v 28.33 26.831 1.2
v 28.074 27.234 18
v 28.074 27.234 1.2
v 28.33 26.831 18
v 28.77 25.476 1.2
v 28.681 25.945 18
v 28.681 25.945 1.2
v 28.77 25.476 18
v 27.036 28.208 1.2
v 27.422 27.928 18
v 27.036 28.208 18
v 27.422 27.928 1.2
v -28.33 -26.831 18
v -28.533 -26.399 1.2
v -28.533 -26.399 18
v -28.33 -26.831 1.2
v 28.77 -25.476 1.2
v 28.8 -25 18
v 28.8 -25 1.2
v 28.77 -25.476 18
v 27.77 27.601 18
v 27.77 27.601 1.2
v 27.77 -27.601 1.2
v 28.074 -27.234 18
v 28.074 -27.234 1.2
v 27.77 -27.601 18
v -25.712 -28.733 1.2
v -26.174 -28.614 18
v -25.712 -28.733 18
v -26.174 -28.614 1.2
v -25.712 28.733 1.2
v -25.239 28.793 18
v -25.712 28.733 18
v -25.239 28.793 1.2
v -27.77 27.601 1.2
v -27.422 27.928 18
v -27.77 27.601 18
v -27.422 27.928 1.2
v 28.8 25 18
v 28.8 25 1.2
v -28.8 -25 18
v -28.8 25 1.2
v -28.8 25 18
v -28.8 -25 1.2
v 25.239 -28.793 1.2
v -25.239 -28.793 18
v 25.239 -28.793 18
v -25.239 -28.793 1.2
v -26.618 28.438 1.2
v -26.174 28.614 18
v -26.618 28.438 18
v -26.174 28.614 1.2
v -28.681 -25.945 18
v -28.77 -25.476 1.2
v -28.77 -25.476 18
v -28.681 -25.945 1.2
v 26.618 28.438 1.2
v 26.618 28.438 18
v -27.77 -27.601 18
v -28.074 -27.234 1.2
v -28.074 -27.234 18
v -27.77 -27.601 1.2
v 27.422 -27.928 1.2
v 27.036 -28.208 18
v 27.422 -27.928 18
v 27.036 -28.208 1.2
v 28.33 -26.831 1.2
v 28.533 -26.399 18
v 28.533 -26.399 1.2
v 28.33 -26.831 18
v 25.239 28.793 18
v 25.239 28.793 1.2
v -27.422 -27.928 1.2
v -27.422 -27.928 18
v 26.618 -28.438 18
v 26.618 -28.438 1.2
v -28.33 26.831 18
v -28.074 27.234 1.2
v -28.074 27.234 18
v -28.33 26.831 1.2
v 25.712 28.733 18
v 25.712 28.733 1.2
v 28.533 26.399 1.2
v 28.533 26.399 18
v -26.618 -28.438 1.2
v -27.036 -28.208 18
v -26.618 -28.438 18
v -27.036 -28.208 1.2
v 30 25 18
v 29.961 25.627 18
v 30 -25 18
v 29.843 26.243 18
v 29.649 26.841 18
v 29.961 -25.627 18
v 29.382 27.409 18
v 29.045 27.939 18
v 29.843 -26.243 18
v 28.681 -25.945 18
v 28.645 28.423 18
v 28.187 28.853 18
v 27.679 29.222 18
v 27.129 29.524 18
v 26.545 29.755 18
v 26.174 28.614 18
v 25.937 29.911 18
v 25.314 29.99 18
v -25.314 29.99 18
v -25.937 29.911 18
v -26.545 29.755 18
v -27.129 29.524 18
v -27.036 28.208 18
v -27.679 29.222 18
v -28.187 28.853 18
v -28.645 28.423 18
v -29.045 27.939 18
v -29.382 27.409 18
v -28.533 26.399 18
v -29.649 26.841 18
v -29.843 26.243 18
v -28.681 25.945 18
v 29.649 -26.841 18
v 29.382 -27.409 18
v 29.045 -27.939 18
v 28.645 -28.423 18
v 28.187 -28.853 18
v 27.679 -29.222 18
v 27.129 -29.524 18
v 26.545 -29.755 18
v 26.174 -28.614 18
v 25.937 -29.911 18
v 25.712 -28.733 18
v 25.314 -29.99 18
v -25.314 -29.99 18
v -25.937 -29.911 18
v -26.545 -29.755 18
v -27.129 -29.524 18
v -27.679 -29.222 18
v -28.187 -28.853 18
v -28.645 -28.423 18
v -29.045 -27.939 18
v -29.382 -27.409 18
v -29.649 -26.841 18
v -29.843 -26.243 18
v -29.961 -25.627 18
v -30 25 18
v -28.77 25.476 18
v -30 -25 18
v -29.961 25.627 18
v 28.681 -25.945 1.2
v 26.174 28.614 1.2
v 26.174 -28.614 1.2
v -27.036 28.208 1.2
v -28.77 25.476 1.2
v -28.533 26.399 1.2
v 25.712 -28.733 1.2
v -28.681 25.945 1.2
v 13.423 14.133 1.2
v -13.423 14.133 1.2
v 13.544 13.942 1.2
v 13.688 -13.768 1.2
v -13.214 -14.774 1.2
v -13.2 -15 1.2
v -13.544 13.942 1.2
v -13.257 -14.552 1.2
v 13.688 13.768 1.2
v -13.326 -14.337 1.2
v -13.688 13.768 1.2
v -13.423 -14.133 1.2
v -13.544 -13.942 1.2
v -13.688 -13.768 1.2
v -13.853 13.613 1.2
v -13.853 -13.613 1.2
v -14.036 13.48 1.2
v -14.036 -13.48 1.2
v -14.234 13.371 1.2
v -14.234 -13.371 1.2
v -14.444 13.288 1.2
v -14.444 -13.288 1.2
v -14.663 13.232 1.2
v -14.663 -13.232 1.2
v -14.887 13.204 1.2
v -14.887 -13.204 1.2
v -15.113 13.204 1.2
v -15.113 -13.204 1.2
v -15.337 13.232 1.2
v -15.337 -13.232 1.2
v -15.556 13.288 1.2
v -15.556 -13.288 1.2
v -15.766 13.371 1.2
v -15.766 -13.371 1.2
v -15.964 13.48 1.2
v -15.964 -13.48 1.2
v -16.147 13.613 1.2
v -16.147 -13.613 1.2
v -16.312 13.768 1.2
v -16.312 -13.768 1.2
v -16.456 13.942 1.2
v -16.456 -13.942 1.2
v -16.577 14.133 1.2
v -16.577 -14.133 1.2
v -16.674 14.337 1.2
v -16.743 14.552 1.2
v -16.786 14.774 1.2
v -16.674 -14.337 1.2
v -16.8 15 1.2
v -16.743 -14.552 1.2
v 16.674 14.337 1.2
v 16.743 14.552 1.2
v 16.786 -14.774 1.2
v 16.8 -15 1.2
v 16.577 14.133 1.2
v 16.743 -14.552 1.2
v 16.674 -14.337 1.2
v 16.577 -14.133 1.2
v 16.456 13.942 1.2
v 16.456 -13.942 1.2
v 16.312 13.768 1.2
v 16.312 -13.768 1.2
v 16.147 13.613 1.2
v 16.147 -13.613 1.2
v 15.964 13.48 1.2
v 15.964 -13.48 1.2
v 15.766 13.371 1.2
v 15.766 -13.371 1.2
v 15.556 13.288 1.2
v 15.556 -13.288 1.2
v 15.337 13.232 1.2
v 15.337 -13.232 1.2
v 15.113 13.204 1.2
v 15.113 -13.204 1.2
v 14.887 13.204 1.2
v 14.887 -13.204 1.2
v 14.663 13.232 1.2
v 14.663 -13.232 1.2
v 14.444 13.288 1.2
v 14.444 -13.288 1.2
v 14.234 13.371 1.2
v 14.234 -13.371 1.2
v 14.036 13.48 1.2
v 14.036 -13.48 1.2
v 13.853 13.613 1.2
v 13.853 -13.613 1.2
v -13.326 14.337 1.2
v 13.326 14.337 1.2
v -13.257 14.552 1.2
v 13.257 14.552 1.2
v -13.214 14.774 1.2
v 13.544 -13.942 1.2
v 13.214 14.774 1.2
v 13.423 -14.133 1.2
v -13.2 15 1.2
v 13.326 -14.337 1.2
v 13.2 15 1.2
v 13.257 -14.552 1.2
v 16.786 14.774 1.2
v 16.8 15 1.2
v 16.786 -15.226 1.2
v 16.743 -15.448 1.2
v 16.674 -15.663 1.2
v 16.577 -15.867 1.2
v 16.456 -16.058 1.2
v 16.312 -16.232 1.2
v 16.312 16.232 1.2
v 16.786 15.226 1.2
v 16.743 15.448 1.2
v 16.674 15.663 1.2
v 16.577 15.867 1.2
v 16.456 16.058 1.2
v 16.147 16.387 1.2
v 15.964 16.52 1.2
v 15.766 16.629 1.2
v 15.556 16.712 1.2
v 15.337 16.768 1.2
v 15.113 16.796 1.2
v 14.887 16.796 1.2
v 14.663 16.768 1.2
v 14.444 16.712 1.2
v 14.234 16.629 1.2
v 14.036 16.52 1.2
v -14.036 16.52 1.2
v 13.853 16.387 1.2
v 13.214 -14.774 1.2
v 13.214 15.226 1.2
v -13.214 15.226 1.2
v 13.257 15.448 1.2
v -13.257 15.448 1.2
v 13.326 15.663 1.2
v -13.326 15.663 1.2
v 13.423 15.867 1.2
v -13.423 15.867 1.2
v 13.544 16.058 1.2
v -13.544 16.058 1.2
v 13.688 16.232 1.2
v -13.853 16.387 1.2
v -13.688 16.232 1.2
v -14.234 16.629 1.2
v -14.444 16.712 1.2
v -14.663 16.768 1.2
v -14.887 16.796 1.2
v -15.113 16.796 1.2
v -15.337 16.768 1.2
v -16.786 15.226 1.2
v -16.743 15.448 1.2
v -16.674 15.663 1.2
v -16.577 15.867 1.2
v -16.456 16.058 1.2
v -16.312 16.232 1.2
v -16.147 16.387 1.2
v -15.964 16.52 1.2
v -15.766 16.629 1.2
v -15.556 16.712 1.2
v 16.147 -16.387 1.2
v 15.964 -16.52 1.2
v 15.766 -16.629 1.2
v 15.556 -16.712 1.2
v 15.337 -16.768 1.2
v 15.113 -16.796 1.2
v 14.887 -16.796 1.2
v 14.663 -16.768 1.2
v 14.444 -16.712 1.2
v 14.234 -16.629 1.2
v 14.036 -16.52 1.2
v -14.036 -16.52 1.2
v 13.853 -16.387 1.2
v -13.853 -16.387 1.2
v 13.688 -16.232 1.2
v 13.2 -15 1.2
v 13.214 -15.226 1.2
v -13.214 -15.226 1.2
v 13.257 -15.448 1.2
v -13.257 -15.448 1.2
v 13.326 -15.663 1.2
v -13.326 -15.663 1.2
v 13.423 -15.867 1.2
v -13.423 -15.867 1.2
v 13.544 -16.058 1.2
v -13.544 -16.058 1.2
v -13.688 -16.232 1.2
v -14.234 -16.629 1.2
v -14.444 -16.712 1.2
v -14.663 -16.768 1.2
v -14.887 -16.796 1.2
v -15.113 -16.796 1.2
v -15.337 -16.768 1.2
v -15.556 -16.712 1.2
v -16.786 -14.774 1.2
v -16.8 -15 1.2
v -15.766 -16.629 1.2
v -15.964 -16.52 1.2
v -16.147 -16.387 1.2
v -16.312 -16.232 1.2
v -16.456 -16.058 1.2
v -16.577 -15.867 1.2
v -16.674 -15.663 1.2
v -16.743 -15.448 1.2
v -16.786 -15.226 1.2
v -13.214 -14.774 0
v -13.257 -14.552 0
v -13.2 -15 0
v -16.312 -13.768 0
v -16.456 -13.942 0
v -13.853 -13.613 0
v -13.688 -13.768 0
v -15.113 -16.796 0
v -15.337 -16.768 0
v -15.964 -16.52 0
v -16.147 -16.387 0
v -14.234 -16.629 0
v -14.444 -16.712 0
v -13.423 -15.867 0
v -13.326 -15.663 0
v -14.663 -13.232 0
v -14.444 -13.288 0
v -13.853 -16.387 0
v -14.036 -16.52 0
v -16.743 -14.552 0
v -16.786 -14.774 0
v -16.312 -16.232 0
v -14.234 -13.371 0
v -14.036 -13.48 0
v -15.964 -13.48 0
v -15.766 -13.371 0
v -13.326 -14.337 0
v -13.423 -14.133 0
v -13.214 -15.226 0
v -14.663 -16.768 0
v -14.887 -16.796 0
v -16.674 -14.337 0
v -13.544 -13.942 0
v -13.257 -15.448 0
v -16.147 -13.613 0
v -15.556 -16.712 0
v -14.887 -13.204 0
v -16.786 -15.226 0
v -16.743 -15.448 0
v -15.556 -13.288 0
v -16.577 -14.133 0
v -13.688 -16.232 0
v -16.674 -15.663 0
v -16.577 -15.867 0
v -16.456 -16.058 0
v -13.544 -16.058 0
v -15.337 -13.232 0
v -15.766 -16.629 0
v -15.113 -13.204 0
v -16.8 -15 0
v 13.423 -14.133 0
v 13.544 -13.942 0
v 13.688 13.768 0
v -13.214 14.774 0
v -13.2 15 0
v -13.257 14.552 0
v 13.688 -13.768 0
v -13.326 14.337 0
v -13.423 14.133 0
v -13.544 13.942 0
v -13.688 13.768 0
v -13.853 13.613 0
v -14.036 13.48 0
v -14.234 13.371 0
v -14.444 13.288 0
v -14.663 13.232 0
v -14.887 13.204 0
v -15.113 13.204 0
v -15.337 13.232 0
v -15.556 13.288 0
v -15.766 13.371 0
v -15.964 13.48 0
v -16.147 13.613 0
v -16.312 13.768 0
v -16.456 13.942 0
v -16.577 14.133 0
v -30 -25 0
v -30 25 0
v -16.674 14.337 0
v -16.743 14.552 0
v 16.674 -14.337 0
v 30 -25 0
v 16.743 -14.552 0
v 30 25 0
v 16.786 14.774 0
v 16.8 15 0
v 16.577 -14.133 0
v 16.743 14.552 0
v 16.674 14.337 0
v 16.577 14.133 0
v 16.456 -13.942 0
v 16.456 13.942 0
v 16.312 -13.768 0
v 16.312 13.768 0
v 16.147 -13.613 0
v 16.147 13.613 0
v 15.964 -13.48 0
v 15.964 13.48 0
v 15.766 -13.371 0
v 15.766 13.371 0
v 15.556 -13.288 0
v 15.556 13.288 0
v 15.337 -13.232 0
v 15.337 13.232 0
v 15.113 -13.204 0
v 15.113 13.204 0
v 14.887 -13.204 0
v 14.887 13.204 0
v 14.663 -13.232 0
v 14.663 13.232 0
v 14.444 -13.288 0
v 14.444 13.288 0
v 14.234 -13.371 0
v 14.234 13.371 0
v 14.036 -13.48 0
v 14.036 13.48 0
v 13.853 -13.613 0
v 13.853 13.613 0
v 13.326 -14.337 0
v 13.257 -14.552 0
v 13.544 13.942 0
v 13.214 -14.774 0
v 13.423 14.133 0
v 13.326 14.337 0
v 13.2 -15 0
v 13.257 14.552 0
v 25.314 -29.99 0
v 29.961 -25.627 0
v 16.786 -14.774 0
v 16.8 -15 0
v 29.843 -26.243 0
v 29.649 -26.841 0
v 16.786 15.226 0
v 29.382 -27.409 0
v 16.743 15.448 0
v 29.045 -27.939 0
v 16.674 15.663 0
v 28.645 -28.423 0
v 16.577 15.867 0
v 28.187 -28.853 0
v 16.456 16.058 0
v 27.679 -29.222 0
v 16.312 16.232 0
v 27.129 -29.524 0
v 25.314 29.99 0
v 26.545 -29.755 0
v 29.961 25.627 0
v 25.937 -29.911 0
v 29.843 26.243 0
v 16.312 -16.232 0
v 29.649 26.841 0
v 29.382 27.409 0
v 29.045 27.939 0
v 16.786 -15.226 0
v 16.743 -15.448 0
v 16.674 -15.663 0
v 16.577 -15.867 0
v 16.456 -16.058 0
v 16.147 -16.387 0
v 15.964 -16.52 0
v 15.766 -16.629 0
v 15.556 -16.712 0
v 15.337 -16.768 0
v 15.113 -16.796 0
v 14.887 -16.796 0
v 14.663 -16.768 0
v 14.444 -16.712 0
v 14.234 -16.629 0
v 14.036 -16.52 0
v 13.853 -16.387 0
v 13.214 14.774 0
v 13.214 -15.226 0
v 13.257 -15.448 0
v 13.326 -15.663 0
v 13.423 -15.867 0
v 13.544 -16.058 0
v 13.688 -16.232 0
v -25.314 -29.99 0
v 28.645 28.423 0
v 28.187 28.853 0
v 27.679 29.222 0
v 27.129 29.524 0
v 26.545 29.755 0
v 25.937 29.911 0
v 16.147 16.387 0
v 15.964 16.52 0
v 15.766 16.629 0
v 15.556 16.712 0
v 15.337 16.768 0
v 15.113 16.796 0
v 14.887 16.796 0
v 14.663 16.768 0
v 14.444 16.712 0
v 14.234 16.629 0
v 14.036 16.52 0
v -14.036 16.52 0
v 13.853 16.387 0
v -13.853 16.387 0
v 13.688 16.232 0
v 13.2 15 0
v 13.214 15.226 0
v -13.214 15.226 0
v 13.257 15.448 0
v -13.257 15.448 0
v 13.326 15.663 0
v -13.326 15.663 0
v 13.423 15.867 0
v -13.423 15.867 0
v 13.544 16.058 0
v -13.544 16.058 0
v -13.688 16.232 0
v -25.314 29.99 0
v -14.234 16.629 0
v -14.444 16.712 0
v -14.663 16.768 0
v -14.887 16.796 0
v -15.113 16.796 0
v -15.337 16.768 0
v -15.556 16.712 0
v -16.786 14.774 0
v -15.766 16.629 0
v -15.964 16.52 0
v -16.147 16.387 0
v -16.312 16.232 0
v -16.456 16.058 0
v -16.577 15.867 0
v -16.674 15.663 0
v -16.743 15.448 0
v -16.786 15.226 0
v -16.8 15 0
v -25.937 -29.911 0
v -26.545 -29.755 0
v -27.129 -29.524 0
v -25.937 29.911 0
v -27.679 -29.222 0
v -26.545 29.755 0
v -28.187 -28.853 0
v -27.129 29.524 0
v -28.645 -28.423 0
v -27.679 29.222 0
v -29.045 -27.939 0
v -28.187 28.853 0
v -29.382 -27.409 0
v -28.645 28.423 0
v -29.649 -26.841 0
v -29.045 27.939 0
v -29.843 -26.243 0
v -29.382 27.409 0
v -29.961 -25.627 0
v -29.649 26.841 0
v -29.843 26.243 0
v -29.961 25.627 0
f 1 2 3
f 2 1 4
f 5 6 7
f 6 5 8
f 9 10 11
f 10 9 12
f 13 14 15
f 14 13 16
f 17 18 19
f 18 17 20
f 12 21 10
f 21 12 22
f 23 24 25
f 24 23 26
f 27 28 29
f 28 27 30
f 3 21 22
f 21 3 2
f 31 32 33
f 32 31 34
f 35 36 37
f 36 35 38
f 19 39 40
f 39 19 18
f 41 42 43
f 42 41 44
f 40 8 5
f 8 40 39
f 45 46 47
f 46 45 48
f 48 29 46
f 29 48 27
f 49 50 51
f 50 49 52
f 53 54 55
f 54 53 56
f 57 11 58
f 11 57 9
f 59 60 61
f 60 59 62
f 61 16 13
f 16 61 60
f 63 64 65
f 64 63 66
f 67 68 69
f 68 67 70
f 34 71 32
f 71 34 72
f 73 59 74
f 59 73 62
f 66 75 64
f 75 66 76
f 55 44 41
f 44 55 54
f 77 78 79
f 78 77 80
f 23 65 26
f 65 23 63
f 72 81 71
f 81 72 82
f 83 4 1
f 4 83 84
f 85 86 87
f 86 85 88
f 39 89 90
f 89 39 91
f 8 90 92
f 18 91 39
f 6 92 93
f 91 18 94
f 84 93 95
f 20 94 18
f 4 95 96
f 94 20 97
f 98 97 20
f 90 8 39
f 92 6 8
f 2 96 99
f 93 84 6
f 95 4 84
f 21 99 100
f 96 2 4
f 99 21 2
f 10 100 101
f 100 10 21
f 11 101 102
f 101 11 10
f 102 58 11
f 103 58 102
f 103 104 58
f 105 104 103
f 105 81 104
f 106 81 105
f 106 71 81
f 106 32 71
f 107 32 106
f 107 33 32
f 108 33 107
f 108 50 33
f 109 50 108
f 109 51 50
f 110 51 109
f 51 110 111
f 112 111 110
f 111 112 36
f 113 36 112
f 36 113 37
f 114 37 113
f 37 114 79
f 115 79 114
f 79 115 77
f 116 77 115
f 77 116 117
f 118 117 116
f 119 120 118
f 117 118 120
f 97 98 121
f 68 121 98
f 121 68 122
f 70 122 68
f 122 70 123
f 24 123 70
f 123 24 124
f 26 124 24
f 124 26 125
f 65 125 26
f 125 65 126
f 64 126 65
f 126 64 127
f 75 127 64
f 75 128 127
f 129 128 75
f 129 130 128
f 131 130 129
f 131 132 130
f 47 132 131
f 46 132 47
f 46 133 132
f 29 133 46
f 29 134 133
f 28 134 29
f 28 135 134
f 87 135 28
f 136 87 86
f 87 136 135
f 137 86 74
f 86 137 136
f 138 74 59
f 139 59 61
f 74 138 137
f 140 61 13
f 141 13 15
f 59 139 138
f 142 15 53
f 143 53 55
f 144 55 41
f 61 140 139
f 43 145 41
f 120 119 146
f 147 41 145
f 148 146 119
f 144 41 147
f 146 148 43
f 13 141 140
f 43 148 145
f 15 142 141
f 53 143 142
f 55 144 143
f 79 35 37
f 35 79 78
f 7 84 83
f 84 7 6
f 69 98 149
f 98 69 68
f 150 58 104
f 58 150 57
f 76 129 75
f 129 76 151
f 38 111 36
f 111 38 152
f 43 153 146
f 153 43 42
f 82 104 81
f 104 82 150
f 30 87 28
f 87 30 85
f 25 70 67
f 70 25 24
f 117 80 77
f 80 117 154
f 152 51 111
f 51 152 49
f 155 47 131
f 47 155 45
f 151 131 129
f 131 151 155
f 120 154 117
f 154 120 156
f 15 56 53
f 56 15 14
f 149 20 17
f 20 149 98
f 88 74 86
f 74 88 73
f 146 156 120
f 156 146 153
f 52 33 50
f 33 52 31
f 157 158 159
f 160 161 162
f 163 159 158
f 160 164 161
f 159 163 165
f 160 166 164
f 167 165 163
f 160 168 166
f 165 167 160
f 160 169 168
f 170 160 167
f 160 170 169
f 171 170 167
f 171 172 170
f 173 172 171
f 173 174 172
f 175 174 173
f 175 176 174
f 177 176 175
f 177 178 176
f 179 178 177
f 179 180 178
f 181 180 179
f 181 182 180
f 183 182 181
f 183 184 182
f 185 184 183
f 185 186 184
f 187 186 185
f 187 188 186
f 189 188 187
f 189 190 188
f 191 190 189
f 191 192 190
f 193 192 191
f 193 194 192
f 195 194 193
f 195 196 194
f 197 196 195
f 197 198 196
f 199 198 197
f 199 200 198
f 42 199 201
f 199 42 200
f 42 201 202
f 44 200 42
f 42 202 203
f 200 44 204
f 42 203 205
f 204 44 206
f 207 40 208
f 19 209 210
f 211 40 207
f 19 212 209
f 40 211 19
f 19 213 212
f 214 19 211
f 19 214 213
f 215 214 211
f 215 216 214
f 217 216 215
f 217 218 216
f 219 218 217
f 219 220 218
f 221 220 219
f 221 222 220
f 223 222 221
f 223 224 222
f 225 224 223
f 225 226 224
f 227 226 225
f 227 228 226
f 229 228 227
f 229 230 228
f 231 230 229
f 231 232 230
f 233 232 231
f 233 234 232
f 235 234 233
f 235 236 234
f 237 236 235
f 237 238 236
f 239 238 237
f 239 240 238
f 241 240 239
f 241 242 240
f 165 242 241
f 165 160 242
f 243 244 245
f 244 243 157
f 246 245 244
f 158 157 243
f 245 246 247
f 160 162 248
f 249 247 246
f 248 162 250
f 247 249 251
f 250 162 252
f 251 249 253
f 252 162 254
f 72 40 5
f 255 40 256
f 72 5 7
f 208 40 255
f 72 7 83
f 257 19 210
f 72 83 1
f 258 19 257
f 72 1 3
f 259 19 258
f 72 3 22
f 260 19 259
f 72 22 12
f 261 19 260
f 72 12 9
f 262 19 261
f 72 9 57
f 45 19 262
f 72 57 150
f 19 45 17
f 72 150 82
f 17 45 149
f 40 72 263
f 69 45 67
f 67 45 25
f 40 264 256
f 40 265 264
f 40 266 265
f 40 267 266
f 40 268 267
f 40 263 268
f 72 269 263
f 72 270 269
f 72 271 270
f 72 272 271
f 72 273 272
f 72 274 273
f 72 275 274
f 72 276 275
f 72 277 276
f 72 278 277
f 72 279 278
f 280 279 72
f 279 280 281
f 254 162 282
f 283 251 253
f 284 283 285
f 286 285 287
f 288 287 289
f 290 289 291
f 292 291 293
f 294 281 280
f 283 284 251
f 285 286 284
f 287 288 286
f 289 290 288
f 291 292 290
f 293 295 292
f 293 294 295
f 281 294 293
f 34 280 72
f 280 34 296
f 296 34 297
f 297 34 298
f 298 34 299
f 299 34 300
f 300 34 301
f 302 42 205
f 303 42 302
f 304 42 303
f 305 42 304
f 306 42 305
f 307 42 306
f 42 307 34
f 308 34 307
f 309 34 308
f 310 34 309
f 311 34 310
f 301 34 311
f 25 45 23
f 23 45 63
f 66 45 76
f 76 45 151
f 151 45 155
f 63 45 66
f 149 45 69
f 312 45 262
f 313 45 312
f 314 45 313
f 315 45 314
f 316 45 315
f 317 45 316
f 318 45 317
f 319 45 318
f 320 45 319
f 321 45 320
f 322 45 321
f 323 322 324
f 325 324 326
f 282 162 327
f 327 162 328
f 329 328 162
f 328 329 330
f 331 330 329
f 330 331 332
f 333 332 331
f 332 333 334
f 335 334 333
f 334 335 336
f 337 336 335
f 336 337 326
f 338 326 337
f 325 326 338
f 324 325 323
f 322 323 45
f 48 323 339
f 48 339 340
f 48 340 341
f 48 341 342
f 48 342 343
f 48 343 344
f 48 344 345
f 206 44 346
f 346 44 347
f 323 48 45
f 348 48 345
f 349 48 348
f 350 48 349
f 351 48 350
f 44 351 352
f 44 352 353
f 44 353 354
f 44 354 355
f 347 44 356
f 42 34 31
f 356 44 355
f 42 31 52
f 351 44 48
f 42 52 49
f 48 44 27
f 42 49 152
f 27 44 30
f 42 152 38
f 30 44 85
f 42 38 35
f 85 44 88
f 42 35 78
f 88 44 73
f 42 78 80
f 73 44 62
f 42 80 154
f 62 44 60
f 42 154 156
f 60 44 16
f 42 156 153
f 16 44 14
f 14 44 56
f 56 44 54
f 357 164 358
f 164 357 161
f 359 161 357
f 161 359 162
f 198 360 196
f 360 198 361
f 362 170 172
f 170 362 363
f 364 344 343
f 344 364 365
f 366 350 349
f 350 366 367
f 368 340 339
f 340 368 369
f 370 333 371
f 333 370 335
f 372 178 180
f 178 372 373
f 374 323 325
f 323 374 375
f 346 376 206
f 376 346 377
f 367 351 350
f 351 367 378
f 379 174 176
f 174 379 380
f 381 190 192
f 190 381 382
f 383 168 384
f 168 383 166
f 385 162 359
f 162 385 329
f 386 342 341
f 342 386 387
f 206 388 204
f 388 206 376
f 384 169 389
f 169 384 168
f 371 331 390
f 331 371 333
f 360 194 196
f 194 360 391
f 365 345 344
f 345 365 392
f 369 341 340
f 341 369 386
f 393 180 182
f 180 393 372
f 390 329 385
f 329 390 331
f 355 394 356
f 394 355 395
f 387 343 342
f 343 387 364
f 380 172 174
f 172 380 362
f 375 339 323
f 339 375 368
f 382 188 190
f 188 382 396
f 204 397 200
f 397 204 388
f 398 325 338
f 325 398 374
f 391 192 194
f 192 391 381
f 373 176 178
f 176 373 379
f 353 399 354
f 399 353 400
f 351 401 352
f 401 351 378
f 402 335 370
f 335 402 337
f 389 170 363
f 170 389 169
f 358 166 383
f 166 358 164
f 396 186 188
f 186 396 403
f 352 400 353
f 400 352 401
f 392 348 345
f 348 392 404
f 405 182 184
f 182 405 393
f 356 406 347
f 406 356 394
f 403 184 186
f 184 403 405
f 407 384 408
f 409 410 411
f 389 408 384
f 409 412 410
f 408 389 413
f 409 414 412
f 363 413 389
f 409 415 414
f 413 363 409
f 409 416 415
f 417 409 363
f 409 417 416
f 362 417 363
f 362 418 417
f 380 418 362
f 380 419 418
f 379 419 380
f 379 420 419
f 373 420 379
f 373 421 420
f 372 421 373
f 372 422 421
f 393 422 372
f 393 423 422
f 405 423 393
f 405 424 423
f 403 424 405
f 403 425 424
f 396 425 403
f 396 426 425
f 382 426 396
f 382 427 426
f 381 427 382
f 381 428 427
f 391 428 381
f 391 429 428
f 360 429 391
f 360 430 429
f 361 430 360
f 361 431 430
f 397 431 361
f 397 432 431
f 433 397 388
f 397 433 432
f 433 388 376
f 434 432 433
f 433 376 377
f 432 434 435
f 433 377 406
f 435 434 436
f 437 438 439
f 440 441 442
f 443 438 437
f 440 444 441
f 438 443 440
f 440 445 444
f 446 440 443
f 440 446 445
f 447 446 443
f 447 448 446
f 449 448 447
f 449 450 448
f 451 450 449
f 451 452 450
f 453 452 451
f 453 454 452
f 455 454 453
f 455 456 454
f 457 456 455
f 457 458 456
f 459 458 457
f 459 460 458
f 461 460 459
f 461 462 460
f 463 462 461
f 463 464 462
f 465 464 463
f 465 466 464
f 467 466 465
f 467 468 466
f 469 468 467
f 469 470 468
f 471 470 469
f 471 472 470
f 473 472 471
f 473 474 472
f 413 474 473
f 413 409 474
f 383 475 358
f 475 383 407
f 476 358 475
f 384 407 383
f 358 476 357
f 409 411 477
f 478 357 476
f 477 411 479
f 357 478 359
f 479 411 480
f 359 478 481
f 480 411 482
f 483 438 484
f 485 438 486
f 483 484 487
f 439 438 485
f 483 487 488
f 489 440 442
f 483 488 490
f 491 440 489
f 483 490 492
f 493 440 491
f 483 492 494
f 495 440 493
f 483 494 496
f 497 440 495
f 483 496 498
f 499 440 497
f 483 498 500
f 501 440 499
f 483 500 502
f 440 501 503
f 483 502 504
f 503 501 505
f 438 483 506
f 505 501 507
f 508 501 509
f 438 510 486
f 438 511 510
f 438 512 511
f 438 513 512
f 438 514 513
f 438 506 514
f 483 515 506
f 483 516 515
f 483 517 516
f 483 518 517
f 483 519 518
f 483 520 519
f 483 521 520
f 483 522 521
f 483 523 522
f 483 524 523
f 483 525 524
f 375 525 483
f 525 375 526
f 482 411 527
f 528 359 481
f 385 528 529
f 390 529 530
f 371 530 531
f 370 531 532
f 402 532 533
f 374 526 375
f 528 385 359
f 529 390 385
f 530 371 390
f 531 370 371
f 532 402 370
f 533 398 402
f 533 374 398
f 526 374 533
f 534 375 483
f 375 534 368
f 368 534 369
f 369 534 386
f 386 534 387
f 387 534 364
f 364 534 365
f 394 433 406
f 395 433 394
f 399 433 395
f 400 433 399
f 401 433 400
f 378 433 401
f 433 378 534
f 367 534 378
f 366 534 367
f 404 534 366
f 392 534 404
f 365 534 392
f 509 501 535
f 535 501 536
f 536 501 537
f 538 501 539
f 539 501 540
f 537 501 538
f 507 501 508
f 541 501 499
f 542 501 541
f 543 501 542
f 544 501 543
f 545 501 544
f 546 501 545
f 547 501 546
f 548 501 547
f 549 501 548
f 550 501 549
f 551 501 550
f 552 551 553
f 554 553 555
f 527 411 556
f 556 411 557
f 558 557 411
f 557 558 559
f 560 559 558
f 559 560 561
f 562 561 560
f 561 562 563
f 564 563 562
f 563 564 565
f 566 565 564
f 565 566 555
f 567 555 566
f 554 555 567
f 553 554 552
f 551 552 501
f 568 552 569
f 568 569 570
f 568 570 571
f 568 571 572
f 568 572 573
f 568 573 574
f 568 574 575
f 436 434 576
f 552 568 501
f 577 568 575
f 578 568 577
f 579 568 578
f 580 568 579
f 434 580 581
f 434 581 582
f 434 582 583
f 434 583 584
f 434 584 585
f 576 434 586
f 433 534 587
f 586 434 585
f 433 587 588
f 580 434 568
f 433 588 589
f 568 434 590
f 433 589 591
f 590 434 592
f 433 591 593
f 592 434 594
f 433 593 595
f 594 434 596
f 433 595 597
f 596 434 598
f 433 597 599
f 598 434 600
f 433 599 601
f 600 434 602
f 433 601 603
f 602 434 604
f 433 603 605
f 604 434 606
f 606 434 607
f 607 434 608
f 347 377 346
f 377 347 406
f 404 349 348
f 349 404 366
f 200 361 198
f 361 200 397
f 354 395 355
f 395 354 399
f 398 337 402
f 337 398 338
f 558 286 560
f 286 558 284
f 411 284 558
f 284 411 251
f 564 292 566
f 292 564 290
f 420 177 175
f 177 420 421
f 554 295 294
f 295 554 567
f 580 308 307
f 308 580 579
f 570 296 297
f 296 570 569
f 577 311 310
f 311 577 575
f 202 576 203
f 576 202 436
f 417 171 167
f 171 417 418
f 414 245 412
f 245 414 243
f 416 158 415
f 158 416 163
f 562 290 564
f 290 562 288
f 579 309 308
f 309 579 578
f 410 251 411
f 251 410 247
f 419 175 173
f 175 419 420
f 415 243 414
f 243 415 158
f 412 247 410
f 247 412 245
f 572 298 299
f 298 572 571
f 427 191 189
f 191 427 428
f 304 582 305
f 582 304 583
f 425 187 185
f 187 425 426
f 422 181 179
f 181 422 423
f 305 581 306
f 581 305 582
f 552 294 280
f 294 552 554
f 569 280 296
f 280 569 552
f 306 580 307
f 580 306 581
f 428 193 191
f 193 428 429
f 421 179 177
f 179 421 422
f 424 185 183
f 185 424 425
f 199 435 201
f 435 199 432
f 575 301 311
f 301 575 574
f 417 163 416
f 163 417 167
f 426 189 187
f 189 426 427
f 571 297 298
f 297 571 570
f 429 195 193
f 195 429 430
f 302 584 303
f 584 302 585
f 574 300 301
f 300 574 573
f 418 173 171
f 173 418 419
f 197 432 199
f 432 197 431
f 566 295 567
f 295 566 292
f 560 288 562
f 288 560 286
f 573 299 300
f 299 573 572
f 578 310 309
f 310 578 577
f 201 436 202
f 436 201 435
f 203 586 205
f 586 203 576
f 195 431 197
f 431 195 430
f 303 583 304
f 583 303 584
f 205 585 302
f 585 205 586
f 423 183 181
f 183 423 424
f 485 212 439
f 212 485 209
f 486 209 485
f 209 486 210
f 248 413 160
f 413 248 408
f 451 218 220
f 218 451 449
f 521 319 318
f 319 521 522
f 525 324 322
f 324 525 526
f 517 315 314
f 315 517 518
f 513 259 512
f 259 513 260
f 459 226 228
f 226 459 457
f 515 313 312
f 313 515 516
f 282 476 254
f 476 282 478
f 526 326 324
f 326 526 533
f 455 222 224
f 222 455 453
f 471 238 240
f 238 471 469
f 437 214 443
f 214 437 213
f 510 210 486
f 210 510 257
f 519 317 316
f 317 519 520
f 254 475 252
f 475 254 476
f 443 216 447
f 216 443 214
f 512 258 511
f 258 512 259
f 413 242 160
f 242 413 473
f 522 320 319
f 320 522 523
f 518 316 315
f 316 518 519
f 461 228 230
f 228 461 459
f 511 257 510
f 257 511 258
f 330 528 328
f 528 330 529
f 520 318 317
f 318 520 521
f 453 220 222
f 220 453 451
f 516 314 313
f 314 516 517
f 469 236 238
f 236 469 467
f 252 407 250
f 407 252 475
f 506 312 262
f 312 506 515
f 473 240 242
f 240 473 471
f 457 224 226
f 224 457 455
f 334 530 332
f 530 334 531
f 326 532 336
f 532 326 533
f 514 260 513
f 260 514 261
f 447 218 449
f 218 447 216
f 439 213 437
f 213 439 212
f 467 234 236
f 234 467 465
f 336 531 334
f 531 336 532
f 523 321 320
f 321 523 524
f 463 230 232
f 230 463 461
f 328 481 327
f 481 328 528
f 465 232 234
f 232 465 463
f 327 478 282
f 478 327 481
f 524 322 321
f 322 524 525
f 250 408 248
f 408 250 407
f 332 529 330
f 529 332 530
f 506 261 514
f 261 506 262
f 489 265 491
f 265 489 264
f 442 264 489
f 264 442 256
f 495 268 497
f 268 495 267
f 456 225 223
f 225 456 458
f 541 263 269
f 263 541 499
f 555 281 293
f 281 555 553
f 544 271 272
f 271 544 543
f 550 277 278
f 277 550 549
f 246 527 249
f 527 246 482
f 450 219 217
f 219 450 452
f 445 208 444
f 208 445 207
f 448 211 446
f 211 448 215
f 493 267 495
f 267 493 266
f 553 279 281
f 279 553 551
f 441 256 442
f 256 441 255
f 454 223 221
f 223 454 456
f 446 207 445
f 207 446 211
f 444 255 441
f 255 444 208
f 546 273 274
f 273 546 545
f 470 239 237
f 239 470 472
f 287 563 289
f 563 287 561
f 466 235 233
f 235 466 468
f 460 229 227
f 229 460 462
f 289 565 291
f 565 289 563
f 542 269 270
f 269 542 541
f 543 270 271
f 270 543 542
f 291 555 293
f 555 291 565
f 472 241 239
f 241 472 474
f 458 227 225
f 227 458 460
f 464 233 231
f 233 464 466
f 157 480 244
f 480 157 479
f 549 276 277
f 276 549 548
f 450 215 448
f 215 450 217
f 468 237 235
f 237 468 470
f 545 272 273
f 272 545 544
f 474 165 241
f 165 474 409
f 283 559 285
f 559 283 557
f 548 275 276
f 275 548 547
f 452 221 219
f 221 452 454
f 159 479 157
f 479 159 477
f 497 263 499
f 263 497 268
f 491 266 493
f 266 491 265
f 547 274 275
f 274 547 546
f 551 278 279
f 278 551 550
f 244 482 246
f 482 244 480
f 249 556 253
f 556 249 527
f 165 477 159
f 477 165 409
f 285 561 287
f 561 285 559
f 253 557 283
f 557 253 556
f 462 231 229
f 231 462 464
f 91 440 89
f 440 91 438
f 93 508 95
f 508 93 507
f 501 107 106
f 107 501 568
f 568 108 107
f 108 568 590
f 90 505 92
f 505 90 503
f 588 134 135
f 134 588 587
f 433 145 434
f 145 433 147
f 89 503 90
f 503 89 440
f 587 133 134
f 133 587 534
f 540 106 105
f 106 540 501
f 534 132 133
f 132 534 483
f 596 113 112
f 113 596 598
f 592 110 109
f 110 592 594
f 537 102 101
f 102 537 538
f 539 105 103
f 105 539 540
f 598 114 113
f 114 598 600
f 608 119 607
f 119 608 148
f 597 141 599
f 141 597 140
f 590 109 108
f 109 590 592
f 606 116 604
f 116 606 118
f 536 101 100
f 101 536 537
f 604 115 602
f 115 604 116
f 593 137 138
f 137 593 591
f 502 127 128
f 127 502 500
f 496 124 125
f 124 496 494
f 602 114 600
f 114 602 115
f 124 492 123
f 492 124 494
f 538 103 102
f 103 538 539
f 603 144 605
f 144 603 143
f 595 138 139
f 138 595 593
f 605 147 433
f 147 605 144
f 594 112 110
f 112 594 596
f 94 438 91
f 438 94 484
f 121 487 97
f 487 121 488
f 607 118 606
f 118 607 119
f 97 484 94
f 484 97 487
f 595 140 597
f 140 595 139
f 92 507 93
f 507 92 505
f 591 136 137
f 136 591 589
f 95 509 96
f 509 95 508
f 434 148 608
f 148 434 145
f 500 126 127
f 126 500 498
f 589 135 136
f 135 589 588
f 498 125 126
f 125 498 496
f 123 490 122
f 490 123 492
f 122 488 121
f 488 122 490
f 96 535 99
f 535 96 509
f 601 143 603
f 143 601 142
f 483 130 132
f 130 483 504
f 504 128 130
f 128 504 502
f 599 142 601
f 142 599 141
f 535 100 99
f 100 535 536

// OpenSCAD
$fn = 50;


difference() {
	union() {
		hull() {
			translate(v = [-25.0000000000, 25.0000000000, 0]) {
				cylinder(h = 18, r = 5);
			}
			translate(v = [25.0000000000, 25.0000000000, 0]) {
				cylinder(h = 18, r = 5);
			}
			translate(v = [-25.0000000000, -25.0000000000, 0]) {
				cylinder(h = 18, r = 5);
			}
			translate(v = [25.0000000000, -25.0000000000, 0]) {
				cylinder(h = 18, r = 5);
			}
		}
	}
	union() {
		translate(v = [0, 0, 1.2000000000]) {
			hull() {
				translate(v = [-25.0000000000, 25.0000000000, 0]) {
					cylinder(h = 16.8000000000, r = 3.8000000000);
				}
				translate(v = [25.0000000000, 25.0000000000, 0]) {
					cylinder(h = 16.8000000000, r = 3.8000000000);
				}
				translate(v = [-25.0000000000, -25.0000000000, 0]) {
					cylinder(h = 16.8000000000, r = 3.8000000000);
				}
				translate(v = [25.0000000000, -25.0000000000, 0]) {
					cylinder(h = 16.8000000000, r = 3.8000000000);
				}
			}
		}
		#translate(v = [-15.0000000000, -15.0000000000, 0]) {
			cylinder(h = 1.2000000000, r = 1.8000000000);
		}
		#translate(v = [-15.0000000000, 15.0000000000, 0]) {
			cylinder(h = 1.2000000000, r = 1.8000000000);
		}
		#translate(v = [15.0000000000, -15.0000000000, 0]) {
			cylinder(h = 1.2000000000, r = 1.8000000000);
		}
		#translate(v = [15.0000000000, 15.0000000000, 0]) {
			cylinder(h = 1.2000000000, r = 1.8000000000);
		}
	}
}
